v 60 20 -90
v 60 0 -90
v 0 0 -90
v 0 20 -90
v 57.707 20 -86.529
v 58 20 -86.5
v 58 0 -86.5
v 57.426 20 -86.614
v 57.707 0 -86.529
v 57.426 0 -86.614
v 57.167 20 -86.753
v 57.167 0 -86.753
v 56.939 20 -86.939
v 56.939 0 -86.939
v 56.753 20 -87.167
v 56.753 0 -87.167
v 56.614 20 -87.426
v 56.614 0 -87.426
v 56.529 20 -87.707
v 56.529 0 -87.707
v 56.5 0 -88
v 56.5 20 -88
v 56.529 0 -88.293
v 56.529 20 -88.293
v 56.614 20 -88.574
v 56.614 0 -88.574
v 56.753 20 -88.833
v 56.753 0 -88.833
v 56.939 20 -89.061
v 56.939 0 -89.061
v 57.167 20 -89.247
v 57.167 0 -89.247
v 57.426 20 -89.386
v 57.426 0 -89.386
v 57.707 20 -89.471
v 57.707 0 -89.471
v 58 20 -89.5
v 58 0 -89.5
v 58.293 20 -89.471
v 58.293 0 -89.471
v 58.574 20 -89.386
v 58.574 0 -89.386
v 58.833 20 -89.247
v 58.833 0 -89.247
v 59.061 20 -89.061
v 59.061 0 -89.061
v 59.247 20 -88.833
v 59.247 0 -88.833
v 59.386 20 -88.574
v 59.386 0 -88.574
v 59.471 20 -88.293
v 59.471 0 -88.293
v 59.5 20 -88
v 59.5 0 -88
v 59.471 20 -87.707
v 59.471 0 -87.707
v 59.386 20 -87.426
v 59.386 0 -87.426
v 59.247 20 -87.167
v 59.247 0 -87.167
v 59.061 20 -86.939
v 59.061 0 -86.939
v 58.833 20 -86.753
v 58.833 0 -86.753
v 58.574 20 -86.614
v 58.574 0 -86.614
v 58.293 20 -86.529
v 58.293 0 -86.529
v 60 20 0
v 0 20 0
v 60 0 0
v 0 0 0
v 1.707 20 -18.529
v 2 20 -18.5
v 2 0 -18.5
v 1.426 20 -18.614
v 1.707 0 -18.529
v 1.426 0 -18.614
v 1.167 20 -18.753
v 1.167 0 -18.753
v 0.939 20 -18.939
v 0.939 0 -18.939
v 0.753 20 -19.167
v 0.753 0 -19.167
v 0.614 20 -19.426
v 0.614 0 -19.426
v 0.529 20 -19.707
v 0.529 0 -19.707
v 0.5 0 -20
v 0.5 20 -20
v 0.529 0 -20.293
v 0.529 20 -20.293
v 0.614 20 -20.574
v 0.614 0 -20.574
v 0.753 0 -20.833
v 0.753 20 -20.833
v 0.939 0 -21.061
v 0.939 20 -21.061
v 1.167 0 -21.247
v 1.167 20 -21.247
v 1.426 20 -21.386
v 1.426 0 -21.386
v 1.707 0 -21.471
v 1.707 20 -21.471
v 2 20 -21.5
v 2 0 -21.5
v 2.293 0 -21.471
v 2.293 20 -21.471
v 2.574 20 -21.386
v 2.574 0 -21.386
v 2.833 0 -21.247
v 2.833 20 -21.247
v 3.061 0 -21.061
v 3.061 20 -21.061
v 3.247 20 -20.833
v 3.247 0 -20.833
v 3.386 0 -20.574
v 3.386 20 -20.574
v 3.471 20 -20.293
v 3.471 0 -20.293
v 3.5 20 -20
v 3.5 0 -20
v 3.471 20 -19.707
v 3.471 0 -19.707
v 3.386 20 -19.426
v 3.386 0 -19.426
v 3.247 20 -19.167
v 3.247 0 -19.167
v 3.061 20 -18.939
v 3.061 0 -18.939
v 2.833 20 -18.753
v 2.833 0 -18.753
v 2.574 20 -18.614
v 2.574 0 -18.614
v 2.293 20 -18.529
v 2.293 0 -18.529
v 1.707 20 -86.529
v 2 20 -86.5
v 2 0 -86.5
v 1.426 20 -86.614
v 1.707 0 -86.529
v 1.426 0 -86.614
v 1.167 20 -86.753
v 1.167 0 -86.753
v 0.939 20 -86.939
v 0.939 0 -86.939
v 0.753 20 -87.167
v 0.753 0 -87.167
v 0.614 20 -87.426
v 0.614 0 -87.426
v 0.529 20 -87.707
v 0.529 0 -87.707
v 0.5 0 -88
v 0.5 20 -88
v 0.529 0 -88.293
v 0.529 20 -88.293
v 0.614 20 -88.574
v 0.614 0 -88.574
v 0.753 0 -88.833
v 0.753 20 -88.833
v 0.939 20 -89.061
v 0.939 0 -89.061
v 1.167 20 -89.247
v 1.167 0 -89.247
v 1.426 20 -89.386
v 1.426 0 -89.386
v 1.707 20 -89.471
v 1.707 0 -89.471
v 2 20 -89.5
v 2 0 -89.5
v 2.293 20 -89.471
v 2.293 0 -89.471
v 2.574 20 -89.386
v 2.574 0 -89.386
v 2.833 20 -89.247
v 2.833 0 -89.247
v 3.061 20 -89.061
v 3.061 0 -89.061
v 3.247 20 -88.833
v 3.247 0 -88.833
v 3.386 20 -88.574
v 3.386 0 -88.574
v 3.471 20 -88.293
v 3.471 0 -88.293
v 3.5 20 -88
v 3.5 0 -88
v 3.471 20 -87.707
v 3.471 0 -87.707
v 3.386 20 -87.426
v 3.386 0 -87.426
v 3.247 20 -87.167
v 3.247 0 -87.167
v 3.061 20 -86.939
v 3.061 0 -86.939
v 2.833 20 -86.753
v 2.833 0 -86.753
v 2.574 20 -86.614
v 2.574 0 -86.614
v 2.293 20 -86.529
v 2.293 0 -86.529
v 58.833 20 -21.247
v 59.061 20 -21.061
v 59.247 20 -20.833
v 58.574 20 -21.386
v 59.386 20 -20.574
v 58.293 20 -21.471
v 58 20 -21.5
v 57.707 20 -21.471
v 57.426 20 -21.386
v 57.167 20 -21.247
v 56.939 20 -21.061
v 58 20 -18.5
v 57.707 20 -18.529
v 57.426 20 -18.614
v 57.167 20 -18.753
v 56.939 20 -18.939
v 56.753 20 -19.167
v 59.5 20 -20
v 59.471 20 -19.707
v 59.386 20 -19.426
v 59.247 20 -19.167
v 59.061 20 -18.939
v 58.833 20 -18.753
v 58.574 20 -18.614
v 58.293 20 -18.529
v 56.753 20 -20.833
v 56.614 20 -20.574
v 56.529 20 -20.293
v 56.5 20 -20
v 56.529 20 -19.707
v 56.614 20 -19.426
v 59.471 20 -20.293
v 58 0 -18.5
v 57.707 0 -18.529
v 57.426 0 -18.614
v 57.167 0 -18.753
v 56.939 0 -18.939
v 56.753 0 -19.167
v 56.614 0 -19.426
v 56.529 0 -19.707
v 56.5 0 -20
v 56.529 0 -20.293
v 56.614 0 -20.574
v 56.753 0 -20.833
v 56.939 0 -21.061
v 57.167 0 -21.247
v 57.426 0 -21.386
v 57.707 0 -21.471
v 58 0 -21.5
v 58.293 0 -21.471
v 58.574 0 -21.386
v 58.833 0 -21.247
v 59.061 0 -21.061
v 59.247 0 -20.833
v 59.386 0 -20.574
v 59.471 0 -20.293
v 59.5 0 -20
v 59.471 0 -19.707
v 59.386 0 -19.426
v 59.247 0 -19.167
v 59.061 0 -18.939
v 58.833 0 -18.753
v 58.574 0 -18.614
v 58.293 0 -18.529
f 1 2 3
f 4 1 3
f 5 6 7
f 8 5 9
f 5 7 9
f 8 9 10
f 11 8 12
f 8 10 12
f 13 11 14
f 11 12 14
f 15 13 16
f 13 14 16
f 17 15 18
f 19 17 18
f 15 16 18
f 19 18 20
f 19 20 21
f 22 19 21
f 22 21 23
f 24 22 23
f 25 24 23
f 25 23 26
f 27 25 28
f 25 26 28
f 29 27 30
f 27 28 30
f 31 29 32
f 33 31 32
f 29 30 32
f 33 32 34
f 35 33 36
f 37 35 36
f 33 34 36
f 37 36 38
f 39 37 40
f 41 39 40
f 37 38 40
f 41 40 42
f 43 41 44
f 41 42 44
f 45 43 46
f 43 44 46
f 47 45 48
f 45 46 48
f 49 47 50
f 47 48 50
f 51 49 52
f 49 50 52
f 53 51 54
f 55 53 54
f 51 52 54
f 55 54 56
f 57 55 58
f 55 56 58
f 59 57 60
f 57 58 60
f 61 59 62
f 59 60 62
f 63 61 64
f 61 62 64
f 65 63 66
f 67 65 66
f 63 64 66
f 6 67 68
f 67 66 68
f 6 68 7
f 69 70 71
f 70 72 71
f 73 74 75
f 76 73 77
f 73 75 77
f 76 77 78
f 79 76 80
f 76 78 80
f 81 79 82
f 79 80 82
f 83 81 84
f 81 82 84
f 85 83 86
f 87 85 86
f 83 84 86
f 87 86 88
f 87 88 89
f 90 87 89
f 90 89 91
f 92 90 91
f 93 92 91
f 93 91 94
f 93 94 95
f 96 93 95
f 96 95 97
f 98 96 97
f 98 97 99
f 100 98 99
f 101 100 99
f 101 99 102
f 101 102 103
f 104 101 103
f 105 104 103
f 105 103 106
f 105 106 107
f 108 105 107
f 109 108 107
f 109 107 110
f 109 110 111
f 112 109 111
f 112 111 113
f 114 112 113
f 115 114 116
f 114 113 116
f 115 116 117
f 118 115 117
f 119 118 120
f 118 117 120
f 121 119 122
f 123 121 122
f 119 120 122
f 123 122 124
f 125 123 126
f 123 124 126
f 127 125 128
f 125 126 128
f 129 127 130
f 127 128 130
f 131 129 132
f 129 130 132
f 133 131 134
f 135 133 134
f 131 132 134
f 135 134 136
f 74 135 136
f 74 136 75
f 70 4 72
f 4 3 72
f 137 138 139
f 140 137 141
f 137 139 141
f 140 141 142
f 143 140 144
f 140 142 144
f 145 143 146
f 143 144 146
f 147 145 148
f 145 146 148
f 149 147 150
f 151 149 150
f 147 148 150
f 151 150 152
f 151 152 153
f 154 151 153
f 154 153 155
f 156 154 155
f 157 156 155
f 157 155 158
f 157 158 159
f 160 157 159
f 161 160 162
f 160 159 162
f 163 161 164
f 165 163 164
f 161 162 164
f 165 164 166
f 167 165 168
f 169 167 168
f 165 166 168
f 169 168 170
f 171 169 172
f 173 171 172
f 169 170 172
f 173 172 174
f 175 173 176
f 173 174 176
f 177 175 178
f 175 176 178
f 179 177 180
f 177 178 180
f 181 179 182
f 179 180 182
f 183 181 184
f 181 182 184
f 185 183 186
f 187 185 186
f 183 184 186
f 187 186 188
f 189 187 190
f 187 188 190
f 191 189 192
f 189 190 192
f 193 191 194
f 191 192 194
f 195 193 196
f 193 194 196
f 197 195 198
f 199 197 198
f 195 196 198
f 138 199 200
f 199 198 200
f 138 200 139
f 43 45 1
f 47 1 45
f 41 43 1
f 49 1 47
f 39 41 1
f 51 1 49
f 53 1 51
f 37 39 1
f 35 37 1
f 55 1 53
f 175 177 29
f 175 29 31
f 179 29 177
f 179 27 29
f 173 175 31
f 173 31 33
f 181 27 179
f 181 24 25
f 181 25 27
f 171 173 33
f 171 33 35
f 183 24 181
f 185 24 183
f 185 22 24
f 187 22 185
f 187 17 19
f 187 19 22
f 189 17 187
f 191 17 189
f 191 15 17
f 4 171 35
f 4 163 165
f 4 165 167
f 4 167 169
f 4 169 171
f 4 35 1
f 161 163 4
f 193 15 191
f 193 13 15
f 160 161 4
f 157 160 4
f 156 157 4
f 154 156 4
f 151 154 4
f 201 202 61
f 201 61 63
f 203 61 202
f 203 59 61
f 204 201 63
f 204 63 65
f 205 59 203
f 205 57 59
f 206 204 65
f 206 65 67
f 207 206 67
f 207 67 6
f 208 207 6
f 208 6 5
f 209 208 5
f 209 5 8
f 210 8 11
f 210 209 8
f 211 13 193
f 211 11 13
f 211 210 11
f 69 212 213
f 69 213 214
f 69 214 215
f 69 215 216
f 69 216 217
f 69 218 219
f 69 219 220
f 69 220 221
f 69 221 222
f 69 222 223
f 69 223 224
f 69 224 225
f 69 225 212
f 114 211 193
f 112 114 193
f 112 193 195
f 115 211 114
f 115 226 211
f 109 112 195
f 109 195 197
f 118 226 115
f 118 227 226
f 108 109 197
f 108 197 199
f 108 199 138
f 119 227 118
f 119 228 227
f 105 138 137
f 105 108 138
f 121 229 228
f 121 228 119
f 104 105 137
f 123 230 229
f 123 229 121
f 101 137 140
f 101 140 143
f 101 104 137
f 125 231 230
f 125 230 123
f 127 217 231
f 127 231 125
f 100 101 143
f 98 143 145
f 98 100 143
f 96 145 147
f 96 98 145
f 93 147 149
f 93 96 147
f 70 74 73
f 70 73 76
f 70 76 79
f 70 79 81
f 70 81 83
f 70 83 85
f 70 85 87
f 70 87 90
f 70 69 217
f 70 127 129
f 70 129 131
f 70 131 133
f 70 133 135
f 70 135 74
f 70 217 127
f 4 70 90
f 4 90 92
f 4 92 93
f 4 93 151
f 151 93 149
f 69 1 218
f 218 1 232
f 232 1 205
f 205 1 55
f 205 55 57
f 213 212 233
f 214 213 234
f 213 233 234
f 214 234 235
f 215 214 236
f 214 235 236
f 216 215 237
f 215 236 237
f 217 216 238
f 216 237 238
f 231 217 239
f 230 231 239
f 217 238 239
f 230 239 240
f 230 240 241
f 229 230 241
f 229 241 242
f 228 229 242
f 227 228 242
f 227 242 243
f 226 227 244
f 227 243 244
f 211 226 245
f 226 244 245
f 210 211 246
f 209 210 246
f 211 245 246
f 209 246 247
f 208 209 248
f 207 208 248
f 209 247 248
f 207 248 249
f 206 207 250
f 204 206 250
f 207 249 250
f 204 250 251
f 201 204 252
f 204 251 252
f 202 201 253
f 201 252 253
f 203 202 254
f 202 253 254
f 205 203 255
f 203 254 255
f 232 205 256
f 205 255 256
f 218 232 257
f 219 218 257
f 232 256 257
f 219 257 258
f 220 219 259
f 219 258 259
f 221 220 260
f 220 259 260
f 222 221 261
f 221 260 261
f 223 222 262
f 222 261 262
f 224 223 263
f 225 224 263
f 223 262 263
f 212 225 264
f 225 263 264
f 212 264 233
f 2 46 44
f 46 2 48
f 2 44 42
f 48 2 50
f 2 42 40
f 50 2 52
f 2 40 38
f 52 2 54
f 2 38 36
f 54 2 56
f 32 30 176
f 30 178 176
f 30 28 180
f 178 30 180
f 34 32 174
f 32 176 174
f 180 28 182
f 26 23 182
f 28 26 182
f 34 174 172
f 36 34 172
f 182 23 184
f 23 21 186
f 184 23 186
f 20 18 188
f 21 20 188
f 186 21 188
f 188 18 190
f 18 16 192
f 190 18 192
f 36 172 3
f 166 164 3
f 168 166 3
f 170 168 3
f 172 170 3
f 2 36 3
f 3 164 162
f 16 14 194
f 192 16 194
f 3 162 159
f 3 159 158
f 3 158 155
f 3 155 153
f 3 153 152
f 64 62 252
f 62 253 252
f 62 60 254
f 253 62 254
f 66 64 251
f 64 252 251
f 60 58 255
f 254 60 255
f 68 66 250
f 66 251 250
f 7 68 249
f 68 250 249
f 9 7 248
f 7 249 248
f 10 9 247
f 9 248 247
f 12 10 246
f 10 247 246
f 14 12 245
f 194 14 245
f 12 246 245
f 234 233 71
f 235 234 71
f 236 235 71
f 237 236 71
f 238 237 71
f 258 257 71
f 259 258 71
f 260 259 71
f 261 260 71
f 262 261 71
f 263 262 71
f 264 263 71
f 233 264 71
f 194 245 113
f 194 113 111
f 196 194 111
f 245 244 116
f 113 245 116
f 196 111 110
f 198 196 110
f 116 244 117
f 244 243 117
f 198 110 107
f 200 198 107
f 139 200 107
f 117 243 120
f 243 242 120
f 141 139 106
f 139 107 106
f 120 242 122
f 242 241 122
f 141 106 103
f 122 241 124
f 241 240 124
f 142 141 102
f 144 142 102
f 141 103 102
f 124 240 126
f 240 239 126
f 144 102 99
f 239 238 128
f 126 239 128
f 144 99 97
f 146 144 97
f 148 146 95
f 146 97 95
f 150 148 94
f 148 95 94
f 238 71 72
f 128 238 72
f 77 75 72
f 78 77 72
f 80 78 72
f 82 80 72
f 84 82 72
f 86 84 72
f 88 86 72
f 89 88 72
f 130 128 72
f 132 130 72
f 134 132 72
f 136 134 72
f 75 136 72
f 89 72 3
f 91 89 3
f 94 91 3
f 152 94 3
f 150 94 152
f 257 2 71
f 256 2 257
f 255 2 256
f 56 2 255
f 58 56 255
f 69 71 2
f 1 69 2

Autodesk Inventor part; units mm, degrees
ref_plane "YZ Plane" through (0, 0, 0) normal (1, 0, 0) x (0, 1, 0)
ref_plane "XZ Plane" through (0, 0, 0) normal (0, 1, 0) x (-1, 0, 0)
ref_plane "XY Plane" through (0, 0, 0) normal (0, 0, 1) x (1, 0, 0)
sketch "Skizze1" plane through (0, 0, 0) normal (0, 1, 0) x (-1, 0, 0)
  line L0 (0, 0) -> (-60, 0)
  line L1 (-60, 0) -> (-60, -90)
  line L2 (-60, -90) -> (0, -90)
  line L3 (0, -90) -> (0, 0)
  dimension "d0" = 60
  dimension "d1" = 90
extrude "Extrusion1" add sketch "Skizze1" along normal blind 20
sketch "Skizze2" plane through (0, 20, 0) normal (0, 1, 0) x (1, 0, 0)
  line L0 (60, 0) -> (60, 90) projected
  line L1 (60, 90) -> (0, 90) projected
  line L2 (0, 90) -> (0, 0) projected
  line L3 (0, 0) -> (60, 0) projected
  point P0 (58, 88)
  point P1 (2, 88)
  point P2 (2, 20)
  point P3 (58, 20)
  dimension "d4" = 2
  dimension "d5" = 2
  dimension "d6" = 2
  dimension "d7" = 2
  dimension "d8" = 2
  dimension "d9" = 2
  dimension "d10" = 20
  dimension "d11" = 20
hole "Bohrung1" at (58, 20, -88) at (58, 20, -20) at (2, 20, -88) at (2, 20, -20) direction (0, -1, 0) diameter 3 end through all
properties part number "Raspberry_Dummy"
